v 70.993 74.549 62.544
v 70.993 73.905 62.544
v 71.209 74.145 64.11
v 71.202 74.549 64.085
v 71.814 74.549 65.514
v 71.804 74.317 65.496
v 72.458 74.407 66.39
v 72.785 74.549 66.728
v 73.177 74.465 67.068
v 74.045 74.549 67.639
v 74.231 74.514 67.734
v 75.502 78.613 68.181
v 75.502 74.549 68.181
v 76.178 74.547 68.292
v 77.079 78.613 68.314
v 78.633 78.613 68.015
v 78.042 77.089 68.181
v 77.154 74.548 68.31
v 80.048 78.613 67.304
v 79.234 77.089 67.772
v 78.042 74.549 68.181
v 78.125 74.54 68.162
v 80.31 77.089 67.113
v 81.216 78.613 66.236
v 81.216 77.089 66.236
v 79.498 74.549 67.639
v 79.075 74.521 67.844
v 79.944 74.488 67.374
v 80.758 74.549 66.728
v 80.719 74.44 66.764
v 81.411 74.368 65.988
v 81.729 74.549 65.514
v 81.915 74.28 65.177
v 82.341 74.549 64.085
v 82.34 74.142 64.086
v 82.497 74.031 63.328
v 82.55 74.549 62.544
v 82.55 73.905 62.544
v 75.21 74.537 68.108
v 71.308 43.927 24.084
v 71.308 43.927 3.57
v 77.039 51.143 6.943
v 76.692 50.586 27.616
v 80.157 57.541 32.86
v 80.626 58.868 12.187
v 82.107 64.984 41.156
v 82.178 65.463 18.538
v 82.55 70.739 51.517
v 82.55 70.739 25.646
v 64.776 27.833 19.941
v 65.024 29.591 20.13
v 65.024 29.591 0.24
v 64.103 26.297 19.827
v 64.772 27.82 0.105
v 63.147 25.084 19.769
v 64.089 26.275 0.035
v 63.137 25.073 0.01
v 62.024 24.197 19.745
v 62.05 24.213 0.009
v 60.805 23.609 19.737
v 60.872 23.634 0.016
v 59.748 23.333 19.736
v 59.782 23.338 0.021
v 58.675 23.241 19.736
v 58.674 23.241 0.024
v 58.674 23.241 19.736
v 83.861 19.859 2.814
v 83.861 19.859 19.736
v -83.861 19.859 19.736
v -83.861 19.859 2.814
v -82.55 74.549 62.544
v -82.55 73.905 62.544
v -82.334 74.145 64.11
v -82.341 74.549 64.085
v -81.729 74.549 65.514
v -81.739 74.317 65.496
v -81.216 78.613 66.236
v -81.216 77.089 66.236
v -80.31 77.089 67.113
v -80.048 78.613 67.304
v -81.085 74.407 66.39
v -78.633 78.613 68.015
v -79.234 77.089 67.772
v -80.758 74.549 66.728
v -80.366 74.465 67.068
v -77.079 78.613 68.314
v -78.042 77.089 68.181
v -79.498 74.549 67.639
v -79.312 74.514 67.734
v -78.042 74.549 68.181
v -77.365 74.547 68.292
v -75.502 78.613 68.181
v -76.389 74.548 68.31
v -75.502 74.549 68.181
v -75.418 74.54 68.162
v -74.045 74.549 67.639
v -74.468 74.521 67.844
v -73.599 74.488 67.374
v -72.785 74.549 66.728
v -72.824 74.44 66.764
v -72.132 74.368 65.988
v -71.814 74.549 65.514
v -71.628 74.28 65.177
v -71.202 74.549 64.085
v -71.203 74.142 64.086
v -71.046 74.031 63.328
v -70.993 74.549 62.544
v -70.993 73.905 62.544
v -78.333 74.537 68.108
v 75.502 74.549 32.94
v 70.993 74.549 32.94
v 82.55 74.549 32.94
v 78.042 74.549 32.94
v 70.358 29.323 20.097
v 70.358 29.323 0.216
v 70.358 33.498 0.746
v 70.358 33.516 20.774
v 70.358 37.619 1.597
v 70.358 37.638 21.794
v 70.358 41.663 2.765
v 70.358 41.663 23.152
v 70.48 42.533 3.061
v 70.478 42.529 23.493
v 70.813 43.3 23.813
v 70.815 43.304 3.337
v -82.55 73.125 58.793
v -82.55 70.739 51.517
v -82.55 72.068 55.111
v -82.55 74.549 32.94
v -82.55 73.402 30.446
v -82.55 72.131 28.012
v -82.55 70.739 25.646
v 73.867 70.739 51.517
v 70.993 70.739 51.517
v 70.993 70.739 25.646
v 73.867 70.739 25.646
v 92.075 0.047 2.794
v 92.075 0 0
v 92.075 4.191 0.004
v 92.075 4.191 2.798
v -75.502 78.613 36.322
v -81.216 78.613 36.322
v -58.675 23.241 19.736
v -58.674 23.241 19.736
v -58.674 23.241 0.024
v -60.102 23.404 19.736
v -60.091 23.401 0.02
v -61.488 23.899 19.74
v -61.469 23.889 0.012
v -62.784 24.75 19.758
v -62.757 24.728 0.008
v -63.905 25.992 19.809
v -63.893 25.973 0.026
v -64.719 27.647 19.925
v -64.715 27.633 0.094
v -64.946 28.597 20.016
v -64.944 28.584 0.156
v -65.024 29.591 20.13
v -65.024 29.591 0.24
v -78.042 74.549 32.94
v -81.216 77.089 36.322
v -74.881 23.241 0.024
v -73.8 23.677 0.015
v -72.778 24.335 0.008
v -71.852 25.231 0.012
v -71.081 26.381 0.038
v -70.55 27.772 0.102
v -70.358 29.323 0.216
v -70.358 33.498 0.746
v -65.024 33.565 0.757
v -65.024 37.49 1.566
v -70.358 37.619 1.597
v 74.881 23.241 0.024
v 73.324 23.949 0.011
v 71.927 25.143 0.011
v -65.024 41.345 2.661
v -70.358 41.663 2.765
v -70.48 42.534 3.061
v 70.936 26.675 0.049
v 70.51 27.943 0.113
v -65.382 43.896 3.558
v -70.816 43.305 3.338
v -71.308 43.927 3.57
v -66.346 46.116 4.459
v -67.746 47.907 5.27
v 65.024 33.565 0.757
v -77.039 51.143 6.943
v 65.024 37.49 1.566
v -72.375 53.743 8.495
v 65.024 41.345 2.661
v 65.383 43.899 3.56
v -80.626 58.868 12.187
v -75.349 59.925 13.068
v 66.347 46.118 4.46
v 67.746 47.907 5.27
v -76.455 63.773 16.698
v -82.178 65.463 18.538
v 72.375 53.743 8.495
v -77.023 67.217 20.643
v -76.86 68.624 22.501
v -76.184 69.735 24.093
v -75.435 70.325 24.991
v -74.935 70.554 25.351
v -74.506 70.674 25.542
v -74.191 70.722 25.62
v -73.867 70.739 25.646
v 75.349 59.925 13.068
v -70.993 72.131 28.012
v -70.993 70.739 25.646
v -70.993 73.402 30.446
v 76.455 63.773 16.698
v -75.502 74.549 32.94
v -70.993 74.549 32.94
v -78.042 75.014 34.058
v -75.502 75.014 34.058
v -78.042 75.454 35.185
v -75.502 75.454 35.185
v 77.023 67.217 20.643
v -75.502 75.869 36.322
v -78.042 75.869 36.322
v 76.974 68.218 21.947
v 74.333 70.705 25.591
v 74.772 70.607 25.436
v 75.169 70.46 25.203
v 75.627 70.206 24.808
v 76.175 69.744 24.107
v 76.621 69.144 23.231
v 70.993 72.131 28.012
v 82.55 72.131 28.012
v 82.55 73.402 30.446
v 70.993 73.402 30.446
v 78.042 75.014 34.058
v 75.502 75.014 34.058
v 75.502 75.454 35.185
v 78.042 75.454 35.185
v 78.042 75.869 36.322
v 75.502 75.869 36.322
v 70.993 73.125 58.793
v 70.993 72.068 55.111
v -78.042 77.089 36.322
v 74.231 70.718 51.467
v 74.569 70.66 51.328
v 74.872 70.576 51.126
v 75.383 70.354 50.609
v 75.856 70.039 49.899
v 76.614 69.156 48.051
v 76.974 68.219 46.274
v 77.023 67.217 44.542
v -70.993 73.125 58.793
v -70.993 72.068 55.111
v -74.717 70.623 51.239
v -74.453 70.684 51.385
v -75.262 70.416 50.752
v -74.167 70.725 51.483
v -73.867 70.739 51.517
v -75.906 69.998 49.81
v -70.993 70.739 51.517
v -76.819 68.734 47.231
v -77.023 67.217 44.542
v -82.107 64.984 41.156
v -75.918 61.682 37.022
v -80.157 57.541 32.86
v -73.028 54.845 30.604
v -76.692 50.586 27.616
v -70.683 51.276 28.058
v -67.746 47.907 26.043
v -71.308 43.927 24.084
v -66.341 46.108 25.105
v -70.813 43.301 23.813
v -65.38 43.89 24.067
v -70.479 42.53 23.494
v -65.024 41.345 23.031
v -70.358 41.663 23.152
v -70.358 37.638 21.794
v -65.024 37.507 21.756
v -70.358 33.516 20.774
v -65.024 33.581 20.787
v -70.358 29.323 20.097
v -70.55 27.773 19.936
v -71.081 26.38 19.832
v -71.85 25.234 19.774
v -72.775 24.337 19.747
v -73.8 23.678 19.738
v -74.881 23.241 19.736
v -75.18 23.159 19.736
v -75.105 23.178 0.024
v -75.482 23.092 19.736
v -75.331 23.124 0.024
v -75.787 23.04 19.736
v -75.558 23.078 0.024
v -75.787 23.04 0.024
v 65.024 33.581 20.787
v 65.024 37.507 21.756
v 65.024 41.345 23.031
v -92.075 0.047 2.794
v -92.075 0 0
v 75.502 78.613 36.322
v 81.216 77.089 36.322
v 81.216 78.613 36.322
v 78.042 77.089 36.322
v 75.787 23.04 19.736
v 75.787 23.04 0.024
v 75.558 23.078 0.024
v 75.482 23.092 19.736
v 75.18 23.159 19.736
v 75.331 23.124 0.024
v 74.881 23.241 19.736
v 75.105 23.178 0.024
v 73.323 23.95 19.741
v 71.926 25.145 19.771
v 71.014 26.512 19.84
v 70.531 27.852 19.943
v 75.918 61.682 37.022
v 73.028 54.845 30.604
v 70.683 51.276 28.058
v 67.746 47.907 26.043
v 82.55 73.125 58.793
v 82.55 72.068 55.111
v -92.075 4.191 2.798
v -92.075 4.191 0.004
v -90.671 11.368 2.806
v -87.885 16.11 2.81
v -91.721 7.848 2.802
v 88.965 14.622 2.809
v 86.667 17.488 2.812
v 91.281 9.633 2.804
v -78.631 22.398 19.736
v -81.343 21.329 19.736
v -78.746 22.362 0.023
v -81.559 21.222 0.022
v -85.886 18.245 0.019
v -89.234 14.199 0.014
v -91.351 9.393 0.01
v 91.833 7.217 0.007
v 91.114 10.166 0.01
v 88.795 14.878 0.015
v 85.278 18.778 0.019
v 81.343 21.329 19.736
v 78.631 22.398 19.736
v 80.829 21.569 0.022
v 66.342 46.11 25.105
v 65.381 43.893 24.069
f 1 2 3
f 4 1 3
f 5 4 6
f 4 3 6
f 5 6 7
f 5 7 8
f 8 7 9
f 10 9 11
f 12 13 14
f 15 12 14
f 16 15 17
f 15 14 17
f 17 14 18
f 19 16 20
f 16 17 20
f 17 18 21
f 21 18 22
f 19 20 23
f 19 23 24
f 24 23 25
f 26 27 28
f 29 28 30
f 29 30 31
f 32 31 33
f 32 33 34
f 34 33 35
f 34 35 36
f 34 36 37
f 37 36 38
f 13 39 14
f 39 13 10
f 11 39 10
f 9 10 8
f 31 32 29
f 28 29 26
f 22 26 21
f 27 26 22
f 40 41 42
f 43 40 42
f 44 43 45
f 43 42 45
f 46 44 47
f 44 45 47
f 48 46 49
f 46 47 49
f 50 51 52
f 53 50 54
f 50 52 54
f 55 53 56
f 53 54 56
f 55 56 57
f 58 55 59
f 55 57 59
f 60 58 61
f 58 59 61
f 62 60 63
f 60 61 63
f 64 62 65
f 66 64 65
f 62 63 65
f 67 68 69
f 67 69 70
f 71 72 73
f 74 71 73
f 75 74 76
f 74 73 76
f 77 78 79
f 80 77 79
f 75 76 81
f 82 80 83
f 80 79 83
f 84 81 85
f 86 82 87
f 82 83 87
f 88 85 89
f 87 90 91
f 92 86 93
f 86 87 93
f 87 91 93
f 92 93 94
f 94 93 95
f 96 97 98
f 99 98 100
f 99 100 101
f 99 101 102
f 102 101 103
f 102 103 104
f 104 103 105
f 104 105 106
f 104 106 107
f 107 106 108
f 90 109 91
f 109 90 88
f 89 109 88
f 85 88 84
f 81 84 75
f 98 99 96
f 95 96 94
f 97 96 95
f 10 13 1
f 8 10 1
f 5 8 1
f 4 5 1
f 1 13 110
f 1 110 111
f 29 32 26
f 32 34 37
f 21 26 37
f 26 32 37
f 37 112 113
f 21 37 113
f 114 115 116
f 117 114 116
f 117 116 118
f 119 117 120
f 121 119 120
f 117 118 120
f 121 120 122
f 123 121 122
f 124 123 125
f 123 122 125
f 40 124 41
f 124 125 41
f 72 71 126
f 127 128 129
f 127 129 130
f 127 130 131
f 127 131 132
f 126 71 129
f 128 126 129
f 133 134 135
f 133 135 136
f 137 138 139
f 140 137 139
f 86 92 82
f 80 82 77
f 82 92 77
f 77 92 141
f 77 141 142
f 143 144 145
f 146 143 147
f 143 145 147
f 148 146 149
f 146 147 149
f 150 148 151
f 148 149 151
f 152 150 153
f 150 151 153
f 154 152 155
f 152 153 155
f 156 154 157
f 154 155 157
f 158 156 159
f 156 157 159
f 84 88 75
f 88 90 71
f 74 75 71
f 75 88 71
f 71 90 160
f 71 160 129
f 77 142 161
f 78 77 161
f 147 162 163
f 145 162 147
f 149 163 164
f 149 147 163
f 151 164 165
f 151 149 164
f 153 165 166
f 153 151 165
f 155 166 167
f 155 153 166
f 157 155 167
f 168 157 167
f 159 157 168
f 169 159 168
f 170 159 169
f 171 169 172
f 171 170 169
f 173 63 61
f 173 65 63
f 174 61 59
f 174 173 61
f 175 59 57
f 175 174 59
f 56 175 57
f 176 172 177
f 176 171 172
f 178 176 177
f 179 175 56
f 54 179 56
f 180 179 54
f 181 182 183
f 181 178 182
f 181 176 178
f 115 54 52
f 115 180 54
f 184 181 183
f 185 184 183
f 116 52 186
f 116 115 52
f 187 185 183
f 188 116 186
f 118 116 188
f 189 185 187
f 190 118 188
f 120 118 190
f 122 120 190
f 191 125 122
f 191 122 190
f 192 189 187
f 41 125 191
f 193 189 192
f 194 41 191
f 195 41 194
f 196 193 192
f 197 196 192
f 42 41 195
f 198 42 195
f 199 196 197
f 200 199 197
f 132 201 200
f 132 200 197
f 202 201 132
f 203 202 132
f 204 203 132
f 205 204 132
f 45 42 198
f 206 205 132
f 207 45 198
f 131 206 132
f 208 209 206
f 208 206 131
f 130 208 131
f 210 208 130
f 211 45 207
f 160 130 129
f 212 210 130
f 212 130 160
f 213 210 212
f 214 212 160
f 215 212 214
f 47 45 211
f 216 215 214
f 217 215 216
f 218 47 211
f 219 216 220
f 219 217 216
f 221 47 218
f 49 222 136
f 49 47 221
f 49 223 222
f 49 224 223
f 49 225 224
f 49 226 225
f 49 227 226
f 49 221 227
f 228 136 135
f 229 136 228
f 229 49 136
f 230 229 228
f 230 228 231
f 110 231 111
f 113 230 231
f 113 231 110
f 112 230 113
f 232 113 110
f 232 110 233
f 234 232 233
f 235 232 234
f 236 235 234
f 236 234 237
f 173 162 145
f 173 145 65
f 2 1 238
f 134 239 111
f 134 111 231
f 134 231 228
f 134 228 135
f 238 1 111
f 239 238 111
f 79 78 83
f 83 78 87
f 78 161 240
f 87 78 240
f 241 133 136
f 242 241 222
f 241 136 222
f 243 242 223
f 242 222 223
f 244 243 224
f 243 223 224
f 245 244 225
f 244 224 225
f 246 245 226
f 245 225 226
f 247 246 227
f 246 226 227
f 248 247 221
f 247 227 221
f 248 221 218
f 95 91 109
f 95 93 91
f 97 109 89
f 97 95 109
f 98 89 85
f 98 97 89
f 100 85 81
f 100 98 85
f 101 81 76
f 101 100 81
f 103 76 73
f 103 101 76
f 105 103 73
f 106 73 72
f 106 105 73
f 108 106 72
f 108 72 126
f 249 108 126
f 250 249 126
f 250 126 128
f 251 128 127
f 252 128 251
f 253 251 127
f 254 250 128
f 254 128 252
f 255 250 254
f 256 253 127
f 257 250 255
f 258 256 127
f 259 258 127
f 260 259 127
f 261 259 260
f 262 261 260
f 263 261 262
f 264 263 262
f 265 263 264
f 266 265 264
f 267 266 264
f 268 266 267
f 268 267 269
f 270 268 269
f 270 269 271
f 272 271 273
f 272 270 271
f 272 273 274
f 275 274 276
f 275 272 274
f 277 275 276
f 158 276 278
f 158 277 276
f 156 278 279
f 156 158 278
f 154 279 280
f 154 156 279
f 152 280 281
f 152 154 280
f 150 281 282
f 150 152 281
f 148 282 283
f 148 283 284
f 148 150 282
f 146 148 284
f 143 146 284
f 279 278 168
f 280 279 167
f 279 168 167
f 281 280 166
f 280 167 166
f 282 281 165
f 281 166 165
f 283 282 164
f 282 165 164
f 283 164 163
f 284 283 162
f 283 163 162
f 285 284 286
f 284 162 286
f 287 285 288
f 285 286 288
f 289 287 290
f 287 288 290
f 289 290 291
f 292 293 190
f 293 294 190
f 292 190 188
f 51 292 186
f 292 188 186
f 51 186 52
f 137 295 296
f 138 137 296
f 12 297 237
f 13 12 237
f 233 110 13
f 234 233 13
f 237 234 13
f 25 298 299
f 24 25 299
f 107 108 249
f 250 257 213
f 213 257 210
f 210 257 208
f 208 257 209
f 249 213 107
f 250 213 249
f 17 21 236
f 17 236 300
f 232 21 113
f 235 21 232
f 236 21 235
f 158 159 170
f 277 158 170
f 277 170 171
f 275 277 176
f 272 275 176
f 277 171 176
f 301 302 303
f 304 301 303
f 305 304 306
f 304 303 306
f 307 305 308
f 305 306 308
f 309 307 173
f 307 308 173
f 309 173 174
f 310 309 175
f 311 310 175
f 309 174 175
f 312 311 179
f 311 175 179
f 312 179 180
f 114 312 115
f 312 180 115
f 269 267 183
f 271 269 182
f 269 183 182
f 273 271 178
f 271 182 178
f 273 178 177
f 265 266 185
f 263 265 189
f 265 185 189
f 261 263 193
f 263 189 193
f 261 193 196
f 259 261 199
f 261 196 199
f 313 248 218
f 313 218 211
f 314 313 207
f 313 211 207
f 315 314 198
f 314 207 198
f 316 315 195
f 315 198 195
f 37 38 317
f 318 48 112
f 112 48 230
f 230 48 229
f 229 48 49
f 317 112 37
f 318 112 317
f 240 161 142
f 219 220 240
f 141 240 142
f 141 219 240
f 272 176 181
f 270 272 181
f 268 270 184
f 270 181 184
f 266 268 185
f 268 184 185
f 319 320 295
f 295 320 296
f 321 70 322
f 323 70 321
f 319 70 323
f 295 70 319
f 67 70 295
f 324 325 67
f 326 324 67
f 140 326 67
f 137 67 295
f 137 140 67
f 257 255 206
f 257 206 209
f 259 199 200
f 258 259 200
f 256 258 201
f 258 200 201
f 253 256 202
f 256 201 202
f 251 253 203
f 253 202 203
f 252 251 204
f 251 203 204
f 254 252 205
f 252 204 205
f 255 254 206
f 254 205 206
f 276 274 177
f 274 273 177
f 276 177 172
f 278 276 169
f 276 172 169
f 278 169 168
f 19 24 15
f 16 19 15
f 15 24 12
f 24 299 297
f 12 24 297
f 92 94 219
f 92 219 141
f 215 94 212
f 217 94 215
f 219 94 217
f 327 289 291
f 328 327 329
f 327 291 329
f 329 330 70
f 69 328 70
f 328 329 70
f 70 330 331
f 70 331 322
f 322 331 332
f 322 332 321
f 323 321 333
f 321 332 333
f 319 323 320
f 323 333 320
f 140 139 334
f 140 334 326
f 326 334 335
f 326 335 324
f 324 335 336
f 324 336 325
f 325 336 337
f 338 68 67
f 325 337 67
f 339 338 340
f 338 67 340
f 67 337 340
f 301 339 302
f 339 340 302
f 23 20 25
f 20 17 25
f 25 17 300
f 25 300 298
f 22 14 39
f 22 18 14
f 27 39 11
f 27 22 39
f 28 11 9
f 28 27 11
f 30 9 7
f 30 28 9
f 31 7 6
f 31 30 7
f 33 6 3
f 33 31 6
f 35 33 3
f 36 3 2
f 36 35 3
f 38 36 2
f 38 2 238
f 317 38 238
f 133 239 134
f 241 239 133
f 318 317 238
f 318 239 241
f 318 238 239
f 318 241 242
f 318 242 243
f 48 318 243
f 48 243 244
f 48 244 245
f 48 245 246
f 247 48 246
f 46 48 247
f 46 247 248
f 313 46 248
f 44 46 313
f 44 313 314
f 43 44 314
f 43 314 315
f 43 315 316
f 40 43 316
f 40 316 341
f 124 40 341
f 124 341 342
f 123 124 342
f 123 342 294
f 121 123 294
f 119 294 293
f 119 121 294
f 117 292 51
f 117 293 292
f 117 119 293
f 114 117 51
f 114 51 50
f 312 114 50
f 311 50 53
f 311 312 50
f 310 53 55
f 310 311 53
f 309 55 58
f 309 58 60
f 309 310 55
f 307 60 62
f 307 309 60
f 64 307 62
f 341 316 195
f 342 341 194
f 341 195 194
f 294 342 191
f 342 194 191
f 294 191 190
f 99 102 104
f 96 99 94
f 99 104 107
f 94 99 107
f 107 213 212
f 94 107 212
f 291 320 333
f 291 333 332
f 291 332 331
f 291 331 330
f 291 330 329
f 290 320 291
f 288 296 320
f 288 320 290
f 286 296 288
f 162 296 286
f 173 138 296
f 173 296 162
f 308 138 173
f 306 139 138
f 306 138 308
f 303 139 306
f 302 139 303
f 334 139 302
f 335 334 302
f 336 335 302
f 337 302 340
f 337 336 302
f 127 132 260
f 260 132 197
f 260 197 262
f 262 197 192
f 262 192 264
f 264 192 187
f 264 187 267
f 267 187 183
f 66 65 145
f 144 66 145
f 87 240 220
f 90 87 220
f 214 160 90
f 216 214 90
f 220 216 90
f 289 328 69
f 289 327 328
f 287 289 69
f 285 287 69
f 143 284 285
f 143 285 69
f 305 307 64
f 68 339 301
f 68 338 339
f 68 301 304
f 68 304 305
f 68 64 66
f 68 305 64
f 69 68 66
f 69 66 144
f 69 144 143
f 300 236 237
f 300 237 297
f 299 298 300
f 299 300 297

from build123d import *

# Parameters (mm, degrees)
F1_DEPTH = 71.12
F3_DEPTH = 101.6
F5_DEPTH = 78.614


with BuildPart() as f1:
    # F0 (on Top) → F1 (new body)
    with BuildSketch(Plane.XY):
        with BuildLine():
            Line((-92.075, 0), (0, 0))
            Line((0, 0), (92.075, 0))
            Line((92.075, 0), (92.075, 4.191))
            ThreePointArc((92.075, 4.191), (87.438941, 16.646554), (75.78725, 23.039673))
            ThreePointArc((75.78725, 23.039673), (71.903353, 25.170713), (70.358, 29.322564))
            Line((70.358, 29.322564), (70.358, 41.662933))
            ThreePointArc((70.358, 41.662933), (70.60499, 42.890688), (71.307533, 43.927424))
            ThreePointArc((71.307533, 43.927424), (79.625637, 56.202377), (82.55, 70.739))
            Line((82.55, 70.739), (82.55, 74.549))
            Line((82.55, 74.549), (78.0415, 74.549))
            Line((78.0415, 74.549), (78.0415, 77.089))
            Line((78.0415, 77.089), (81.2165, 77.089))
            Line((81.2165, 77.089), (81.2165, 78.613))
            Line((81.2165, 78.613), (78.0415, 78.613))
            Line((78.0415, 78.613), (75.5015, 78.613))
            Line((75.5015, 78.613), (75.5015, 74.549))
            Line((75.5015, 74.549), (70.993, 74.549))
            Line((70.993, 74.549), (70.993, 70.739))
            Line((70.993, 70.739), (73.867173, 70.739))
            ThreePointArc((73.867173, 70.739), (76.23161, 69.682976), (77.023196, 67.217384))
            ThreePointArc((77.023196, 67.217384), (74.034342, 56.769573), (67.745761, 47.907082))
            ThreePointArc((67.745761, 47.907082), (65.731431, 44.897155), (65.024, 41.345152))
            Line((65.024, 41.345152), (65.024, 29.591))
            ThreePointArc((65.024, 29.591), (63.164128, 25.100872), (58.674, 23.241))
            Line((58.674, 23.241), (0, 23.241))
            Line((0, 23.241), (-58.674, 23.241))
            ThreePointArc((-58.674, 23.241), (-63.164128, 25.100872), (-65.024, 29.591))
            Line((-65.024, 29.591), (-65.024, 41.345152))
            ThreePointArc((-65.024, 41.345152), (-65.731431, 44.897155), (-67.745761, 47.907082))
            ThreePointArc((-67.745761, 47.907082), (-74.034342, 56.769573), (-77.023196, 67.217384))
            ThreePointArc((-77.023196, 67.217384), (-76.23161, 69.682976), (-73.867173, 70.739))
            Line((-73.867173, 70.739), (-70.993, 70.739))
            Line((-70.993, 70.739), (-70.993, 74.549))
            Line((-70.993, 74.549), (-75.5015, 74.549))
            Line((-75.5015, 74.549), (-75.5015, 78.613))
            Line((-75.5015, 78.613), (-81.2165, 78.613))
            Line((-81.2165, 78.613), (-81.2165, 77.089))
            Line((-81.2165, 77.089), (-78.0415, 77.089))
            Line((-78.0415, 77.089), (-78.0415, 74.549))
            Line((-78.0415, 74.549), (-82.55, 74.549))
            Line((-82.55, 74.549), (-82.55, 70.739))
            ThreePointArc((-82.55, 70.739), (-79.625637, 56.202377), (-71.307533, 43.927424))
            ThreePointArc((-71.307533, 43.927424), (-70.60499, 42.890688), (-70.358, 41.662933))
            Line((-70.358, 41.662933), (-70.358, 29.322564))
            ThreePointArc((-70.358, 29.322564), (-71.903353, 25.170713), (-75.78725, 23.039673))
            ThreePointArc((-75.78725, 23.039673), (-87.438941, 16.646554), (-92.075, 4.191))
            Line((-92.075, 4.191), (-92.075, 0))
        make_face()
    extrude(amount=F1_DEPTH)

    # F2 (on Right) → F3 (intersect, symmetric)
    with BuildSketch(Plane.YZ):
        with BuildLine():
            Line((0.047138, 2.79405), (0, 0))
            Line((0, 0), (23.240988, 0.02372))
            ThreePointArc((23.240988, 0.02372), (55.450197, 9.625805), (75.869463, 36.322))
            Line((75.869463, 36.322), (78.613, 36.322))
            Line((78.613, 36.322), (78.613, 71.12407))
            Line((78.613, 71.12407), (74.6252, 71.12))
            ThreePointArc((74.6252, 71.12), (59.575116, 34.785884), (23.241, 19.7358))
            Line((23.241, 19.7358), (19.859128, 19.7358))
            Line((19.859128, 19.7358), (19.859128, 2.81427))
            Line((19.859128, 2.81427), (0.047138, 2.79405))
        make_face()
    extrude(amount=F3_DEPTH, both=True, mode=Mode.INTERSECT)

    # F4 (on Front) → F5 (cut, through all)
    with BuildSketch(Plane.XZ):
        with BuildLine():
            Line((-85.773818, 62.544154), (-82.55, 62.544154))
            ThreePointArc((-82.55, 62.544154), (-76.7715, 68.322654), (-70.993, 62.544154))
            Line((-70.993, 62.544154), (-67.021526, 62.544154))
            Line((-67.021526, 62.544154), (-67.021526, 73.423296))
            Line((-67.021526, 73.423296), (-85.773818, 73.423296))
            Line((-85.773818, 73.423296), (-85.773818, 62.544154))
        make_face()
        with BuildLine():
            ThreePointArc((70.993, 62.544154), (76.7715, 68.322654), (82.55, 62.544154))
            Line((82.55, 62.544154), (85.773818, 62.544154))
            Line((85.773818, 62.544154), (85.773818, 73.423296))
            Line((85.773818, 73.423296), (67.021526, 73.423296))
            Line((67.021526, 73.423296), (67.021526, 62.544154))
            Line((67.021526, 62.544154), (70.993, 62.544154))
        make_face()
    extrude(amount=-F5_DEPTH, mode=Mode.SUBTRACT)


solid = f1.part
